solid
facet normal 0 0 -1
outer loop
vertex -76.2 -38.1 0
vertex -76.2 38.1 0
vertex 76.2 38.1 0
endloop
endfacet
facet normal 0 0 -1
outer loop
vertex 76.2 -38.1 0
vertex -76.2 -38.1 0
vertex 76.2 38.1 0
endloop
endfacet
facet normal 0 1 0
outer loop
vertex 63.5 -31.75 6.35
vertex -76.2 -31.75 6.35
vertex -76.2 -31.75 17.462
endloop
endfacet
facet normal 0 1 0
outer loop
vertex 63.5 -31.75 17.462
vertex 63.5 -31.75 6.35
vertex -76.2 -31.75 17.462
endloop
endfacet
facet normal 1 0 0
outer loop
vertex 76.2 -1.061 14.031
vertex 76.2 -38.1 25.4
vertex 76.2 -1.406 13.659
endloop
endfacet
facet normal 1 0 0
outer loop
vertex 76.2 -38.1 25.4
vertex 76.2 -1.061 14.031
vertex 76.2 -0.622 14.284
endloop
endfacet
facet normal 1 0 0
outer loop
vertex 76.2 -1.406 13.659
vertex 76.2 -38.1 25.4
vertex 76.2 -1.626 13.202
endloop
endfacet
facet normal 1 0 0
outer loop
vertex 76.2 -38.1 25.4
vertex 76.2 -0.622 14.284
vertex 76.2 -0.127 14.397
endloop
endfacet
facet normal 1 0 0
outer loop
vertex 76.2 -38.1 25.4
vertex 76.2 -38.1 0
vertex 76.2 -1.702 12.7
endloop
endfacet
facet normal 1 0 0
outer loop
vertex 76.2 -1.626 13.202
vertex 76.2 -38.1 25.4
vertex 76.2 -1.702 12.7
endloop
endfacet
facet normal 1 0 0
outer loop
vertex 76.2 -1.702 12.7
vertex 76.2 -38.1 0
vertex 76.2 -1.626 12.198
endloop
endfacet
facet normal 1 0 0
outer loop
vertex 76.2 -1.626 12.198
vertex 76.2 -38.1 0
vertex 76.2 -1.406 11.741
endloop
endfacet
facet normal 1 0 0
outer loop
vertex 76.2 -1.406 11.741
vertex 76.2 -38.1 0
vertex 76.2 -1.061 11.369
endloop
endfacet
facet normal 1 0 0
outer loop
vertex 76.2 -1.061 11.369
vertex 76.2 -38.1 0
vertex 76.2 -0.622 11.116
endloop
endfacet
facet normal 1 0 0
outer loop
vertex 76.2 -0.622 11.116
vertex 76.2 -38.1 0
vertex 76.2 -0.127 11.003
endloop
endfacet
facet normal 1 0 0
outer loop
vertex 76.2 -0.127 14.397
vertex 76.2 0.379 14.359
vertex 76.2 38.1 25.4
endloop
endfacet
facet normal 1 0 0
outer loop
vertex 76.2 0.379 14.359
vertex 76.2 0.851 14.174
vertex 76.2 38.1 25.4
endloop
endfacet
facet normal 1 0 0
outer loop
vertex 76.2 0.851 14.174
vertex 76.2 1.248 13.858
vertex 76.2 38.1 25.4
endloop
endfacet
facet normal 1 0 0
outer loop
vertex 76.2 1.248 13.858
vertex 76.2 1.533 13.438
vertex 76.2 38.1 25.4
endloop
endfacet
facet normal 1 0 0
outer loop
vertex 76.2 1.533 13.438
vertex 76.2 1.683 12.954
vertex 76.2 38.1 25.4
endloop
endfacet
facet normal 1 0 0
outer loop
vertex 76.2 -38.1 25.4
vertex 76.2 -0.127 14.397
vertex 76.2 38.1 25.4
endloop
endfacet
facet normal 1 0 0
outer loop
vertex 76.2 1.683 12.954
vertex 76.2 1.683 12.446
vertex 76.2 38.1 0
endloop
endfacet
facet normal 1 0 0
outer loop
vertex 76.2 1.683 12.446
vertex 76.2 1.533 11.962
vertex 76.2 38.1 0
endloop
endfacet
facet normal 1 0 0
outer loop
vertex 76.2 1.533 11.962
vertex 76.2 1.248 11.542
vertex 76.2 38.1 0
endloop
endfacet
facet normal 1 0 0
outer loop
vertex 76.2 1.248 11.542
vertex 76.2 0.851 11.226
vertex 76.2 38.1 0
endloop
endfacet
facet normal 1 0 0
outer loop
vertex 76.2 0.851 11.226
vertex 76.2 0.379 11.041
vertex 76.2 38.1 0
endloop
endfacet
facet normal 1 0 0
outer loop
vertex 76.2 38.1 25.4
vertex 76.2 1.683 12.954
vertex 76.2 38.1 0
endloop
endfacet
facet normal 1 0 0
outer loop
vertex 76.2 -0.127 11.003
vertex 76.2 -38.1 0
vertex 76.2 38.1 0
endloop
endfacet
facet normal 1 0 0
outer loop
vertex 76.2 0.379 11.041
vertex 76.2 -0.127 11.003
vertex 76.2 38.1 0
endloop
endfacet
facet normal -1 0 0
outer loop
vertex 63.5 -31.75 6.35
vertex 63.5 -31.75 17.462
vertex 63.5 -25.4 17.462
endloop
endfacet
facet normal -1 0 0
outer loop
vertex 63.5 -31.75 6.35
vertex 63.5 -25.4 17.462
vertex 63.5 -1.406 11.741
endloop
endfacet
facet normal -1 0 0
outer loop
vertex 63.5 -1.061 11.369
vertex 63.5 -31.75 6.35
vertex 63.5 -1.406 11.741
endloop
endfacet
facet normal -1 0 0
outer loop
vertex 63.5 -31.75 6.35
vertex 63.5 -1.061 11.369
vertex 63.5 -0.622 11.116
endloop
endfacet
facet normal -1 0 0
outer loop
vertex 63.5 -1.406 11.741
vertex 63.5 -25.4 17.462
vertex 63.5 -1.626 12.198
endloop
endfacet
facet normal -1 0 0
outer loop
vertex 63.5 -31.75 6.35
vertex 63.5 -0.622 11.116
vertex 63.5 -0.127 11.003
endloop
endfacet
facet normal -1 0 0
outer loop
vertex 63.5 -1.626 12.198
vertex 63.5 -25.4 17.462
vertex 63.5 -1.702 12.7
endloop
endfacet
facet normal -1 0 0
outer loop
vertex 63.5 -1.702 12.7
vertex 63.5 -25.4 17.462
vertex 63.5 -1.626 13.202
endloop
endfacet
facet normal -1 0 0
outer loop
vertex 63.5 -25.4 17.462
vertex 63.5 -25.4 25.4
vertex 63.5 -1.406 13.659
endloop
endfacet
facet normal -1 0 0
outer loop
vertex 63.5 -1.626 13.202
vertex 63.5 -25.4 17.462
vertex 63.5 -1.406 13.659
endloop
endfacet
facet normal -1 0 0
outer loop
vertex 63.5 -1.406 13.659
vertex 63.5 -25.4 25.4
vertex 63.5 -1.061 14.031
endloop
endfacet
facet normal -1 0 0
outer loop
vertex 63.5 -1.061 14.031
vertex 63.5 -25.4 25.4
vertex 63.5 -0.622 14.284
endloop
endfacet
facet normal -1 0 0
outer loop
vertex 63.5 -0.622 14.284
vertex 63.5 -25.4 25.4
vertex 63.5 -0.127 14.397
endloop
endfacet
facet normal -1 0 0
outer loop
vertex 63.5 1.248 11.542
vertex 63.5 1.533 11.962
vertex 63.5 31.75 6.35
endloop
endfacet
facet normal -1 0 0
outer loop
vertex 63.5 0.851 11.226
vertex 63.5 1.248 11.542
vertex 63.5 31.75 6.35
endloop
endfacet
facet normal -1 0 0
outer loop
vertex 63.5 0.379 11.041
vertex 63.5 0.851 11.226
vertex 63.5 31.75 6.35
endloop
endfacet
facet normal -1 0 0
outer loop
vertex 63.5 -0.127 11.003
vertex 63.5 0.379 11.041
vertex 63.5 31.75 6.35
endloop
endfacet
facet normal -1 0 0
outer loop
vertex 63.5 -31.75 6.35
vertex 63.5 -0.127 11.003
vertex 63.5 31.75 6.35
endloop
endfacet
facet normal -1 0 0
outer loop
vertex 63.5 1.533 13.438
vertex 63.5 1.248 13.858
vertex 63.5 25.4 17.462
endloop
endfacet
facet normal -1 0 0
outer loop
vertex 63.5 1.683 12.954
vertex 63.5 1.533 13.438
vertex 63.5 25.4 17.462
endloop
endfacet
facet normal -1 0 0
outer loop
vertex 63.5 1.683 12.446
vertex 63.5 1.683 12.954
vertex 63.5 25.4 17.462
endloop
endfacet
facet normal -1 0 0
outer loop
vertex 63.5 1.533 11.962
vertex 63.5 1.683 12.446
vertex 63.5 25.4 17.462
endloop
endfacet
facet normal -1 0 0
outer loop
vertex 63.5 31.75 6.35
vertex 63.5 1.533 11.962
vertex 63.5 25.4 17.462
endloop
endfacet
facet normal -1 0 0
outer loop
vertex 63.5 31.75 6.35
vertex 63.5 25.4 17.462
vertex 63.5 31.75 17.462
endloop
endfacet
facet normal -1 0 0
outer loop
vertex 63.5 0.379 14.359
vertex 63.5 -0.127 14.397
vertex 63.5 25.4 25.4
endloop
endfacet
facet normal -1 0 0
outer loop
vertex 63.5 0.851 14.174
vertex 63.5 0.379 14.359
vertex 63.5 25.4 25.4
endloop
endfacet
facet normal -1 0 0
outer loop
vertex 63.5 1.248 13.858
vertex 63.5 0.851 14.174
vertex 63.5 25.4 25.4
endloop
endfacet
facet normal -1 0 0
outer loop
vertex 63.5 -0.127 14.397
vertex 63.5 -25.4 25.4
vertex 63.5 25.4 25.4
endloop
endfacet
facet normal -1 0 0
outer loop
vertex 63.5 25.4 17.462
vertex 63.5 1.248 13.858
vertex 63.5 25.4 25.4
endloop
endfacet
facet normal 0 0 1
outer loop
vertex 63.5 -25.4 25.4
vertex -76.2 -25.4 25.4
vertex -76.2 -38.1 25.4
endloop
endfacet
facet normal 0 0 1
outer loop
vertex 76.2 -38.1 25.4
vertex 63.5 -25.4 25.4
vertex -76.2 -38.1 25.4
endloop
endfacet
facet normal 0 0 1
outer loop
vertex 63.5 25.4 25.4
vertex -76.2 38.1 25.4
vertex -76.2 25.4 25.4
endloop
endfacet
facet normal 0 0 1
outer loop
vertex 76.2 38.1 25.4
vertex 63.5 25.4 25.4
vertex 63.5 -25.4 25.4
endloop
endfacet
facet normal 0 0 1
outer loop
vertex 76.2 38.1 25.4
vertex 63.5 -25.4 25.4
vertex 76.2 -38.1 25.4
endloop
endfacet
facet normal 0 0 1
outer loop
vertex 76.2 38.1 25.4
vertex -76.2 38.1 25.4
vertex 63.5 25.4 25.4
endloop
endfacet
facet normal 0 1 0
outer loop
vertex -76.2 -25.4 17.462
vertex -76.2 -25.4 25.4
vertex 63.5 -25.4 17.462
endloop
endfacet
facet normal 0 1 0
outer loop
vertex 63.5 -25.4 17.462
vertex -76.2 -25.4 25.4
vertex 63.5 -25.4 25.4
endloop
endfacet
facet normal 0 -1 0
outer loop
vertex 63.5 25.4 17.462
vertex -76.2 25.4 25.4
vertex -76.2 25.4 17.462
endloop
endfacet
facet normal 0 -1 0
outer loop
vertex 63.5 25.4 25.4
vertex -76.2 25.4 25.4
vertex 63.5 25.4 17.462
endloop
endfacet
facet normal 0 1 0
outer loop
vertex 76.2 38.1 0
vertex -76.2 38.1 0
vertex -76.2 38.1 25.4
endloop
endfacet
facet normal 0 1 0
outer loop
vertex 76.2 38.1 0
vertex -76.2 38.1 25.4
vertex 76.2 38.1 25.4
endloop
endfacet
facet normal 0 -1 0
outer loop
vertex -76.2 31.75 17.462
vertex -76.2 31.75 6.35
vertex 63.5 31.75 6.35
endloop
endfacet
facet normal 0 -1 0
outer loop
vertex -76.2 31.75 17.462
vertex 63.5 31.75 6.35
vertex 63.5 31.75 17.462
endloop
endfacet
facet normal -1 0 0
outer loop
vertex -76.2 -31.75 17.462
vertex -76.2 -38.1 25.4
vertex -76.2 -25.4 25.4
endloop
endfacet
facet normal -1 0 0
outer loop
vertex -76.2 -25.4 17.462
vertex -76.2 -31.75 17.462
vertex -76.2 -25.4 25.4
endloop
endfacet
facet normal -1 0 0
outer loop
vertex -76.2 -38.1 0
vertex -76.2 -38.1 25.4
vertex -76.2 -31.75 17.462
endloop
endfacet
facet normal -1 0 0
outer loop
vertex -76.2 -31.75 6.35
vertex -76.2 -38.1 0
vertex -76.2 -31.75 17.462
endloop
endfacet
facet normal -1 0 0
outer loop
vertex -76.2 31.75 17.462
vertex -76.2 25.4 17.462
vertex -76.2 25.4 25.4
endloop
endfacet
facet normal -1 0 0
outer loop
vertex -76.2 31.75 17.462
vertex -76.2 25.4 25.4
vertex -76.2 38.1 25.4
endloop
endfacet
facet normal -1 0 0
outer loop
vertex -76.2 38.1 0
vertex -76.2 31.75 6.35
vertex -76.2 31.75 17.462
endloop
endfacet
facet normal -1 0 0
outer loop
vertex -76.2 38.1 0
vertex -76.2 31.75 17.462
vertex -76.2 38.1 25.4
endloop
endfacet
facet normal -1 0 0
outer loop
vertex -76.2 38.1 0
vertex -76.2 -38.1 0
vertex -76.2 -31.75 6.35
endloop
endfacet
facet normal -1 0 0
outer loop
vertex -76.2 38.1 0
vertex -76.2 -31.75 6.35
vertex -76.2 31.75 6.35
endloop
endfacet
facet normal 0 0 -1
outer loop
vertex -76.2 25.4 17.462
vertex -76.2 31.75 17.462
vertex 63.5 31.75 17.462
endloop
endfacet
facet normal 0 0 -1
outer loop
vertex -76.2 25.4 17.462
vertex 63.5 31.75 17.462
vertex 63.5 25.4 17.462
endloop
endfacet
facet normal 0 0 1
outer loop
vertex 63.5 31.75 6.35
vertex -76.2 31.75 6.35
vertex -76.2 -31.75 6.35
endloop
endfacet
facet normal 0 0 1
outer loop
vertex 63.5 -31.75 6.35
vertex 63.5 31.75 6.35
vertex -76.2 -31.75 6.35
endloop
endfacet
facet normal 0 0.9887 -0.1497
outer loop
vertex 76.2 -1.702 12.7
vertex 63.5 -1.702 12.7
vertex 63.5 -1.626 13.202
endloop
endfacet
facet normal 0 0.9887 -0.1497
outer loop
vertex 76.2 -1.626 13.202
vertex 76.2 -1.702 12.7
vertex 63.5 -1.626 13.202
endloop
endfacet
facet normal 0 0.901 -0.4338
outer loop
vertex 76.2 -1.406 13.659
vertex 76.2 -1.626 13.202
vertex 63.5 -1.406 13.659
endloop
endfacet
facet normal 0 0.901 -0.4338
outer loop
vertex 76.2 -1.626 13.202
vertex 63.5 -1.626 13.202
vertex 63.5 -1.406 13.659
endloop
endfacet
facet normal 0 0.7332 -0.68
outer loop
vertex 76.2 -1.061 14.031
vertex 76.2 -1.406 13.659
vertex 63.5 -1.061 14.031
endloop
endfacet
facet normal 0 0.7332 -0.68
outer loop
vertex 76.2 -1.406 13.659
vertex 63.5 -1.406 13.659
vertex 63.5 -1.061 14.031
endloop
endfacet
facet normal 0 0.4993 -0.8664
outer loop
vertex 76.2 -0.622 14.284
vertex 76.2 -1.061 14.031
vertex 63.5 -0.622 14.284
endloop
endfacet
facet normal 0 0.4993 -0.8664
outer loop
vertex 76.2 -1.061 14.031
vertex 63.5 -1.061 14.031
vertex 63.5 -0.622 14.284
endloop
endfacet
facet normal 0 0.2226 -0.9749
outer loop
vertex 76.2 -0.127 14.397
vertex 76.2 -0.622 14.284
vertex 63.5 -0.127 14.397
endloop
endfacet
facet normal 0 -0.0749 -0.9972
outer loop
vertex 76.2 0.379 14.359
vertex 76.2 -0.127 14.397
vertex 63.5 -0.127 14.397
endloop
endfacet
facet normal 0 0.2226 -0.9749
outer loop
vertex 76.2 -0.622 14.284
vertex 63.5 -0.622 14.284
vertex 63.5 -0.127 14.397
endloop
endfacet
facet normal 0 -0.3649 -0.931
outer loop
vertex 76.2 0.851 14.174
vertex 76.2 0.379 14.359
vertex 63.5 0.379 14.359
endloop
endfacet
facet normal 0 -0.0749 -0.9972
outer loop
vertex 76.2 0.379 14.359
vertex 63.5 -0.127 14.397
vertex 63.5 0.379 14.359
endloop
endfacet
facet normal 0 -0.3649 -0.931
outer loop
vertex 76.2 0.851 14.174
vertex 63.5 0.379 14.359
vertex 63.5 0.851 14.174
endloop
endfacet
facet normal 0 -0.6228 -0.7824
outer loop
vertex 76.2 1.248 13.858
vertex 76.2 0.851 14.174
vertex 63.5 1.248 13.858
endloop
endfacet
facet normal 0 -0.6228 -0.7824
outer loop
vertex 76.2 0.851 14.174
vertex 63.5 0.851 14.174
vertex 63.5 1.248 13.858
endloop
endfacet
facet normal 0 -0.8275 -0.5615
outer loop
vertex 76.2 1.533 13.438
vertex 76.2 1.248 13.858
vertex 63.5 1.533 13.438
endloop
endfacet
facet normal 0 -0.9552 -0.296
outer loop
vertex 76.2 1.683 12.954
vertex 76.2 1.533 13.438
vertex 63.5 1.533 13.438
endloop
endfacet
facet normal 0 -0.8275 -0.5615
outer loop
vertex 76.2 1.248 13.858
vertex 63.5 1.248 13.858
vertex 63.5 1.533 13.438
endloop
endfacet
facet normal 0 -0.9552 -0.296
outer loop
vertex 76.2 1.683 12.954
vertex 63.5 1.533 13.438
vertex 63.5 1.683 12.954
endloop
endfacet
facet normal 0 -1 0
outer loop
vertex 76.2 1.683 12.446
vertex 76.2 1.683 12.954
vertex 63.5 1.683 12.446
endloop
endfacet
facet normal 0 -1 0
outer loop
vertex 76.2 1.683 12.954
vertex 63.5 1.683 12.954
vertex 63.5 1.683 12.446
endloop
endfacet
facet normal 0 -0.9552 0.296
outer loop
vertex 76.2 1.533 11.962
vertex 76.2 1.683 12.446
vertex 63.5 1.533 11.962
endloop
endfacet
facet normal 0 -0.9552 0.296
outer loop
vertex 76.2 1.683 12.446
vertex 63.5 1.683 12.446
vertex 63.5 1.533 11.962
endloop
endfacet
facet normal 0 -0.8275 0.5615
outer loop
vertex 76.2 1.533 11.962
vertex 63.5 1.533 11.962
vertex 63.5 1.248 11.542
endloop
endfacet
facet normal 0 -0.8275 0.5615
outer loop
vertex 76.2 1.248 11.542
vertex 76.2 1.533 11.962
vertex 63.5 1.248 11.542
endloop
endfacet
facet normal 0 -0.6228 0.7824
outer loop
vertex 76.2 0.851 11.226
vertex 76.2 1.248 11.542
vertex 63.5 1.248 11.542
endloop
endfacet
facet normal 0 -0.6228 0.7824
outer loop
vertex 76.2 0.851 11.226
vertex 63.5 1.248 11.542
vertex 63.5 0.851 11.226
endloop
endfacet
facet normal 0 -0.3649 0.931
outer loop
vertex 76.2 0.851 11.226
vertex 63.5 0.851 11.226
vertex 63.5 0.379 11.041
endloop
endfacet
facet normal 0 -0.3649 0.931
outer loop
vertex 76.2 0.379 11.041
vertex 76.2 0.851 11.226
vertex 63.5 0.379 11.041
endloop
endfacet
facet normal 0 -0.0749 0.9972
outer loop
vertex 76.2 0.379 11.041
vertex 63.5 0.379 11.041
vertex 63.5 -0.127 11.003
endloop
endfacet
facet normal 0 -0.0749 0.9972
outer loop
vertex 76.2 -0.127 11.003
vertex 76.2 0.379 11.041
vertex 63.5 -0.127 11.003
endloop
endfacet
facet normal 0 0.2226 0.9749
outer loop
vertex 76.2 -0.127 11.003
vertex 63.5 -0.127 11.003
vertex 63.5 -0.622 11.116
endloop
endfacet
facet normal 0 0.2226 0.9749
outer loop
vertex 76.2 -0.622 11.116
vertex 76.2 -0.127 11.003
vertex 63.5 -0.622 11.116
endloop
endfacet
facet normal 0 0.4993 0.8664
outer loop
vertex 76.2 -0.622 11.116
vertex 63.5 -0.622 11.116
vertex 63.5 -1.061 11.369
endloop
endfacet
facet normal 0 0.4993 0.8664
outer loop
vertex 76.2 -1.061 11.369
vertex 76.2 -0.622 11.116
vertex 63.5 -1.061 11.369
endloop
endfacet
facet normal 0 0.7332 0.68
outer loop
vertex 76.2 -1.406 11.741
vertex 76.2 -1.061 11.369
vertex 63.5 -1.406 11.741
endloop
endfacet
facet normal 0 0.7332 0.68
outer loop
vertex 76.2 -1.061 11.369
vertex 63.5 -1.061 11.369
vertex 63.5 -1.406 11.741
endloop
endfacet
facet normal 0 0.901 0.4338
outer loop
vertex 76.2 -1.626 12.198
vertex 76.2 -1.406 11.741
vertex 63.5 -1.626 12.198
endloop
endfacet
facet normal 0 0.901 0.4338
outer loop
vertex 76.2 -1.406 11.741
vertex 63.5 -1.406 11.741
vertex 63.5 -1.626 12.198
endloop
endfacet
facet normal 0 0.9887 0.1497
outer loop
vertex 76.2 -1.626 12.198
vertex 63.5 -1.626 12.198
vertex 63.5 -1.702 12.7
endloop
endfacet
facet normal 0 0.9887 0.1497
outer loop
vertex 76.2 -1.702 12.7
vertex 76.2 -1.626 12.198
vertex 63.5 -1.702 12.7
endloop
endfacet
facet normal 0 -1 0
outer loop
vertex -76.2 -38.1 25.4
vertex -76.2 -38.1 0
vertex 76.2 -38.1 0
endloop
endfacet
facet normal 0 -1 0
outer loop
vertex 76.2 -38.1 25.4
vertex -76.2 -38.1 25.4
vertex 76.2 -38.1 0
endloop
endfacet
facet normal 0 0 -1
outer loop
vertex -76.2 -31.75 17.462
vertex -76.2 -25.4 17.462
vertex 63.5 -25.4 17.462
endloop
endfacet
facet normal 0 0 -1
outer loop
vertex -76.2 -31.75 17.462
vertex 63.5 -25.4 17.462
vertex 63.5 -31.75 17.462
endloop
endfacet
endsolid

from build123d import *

# Parameters (mm, degrees)
F0_W     = 152.4
F0_H     = 76.2
F1_DEPTH = 25.4
F2_W     = 139.7
F2_H     = 50.8
F3_DEPTH = 19.05
F4_W     = 6.35
F4_H     = 11.1125
F5_DEPTH = 139.7
F6_R     = 1.7018
F7_DEPTH = 12.7


with BuildPart() as f1:
    # F0 (on Top) → F1 (new body)
    with BuildSketch(Plane.XY):
        Rectangle(F0_W, F0_H)
    extrude(amount=F1_DEPTH)

    # F2 (on face) → F3 (cut)
    with BuildSketch(Plane.XY.offset(25.4)):
        with Locations((-6.35, 0)):
            Rectangle(F2_W, F2_H)
    extrude(amount=-F3_DEPTH, mode=Mode.SUBTRACT)

    # F4 (on face) → F5 (cut)
    with BuildSketch(Plane(origin=(-76.2, 0, 0), x_dir=(0, -1, 0), z_dir=(-1, 0, 0))):
        with Locations((-28.575, 11.90625)):
            Rectangle(F4_W, F4_H)
        with Locations((28.575, 11.90625)):
            Rectangle(F4_W, F4_H)
    extrude(amount=-F5_DEPTH, mode=Mode.SUBTRACT)

    # F6 (on face) → F7 (cut)
    with BuildSketch(Plane(origin=(63.5, 0, 0), x_dir=(0, -1, 0), z_dir=(-1, 0, 0))):
        with Locations((0, 12.7)):
            Circle(F6_R)
    extrude(amount=-F7_DEPTH, mode=Mode.SUBTRACT)


solid = f1.part
